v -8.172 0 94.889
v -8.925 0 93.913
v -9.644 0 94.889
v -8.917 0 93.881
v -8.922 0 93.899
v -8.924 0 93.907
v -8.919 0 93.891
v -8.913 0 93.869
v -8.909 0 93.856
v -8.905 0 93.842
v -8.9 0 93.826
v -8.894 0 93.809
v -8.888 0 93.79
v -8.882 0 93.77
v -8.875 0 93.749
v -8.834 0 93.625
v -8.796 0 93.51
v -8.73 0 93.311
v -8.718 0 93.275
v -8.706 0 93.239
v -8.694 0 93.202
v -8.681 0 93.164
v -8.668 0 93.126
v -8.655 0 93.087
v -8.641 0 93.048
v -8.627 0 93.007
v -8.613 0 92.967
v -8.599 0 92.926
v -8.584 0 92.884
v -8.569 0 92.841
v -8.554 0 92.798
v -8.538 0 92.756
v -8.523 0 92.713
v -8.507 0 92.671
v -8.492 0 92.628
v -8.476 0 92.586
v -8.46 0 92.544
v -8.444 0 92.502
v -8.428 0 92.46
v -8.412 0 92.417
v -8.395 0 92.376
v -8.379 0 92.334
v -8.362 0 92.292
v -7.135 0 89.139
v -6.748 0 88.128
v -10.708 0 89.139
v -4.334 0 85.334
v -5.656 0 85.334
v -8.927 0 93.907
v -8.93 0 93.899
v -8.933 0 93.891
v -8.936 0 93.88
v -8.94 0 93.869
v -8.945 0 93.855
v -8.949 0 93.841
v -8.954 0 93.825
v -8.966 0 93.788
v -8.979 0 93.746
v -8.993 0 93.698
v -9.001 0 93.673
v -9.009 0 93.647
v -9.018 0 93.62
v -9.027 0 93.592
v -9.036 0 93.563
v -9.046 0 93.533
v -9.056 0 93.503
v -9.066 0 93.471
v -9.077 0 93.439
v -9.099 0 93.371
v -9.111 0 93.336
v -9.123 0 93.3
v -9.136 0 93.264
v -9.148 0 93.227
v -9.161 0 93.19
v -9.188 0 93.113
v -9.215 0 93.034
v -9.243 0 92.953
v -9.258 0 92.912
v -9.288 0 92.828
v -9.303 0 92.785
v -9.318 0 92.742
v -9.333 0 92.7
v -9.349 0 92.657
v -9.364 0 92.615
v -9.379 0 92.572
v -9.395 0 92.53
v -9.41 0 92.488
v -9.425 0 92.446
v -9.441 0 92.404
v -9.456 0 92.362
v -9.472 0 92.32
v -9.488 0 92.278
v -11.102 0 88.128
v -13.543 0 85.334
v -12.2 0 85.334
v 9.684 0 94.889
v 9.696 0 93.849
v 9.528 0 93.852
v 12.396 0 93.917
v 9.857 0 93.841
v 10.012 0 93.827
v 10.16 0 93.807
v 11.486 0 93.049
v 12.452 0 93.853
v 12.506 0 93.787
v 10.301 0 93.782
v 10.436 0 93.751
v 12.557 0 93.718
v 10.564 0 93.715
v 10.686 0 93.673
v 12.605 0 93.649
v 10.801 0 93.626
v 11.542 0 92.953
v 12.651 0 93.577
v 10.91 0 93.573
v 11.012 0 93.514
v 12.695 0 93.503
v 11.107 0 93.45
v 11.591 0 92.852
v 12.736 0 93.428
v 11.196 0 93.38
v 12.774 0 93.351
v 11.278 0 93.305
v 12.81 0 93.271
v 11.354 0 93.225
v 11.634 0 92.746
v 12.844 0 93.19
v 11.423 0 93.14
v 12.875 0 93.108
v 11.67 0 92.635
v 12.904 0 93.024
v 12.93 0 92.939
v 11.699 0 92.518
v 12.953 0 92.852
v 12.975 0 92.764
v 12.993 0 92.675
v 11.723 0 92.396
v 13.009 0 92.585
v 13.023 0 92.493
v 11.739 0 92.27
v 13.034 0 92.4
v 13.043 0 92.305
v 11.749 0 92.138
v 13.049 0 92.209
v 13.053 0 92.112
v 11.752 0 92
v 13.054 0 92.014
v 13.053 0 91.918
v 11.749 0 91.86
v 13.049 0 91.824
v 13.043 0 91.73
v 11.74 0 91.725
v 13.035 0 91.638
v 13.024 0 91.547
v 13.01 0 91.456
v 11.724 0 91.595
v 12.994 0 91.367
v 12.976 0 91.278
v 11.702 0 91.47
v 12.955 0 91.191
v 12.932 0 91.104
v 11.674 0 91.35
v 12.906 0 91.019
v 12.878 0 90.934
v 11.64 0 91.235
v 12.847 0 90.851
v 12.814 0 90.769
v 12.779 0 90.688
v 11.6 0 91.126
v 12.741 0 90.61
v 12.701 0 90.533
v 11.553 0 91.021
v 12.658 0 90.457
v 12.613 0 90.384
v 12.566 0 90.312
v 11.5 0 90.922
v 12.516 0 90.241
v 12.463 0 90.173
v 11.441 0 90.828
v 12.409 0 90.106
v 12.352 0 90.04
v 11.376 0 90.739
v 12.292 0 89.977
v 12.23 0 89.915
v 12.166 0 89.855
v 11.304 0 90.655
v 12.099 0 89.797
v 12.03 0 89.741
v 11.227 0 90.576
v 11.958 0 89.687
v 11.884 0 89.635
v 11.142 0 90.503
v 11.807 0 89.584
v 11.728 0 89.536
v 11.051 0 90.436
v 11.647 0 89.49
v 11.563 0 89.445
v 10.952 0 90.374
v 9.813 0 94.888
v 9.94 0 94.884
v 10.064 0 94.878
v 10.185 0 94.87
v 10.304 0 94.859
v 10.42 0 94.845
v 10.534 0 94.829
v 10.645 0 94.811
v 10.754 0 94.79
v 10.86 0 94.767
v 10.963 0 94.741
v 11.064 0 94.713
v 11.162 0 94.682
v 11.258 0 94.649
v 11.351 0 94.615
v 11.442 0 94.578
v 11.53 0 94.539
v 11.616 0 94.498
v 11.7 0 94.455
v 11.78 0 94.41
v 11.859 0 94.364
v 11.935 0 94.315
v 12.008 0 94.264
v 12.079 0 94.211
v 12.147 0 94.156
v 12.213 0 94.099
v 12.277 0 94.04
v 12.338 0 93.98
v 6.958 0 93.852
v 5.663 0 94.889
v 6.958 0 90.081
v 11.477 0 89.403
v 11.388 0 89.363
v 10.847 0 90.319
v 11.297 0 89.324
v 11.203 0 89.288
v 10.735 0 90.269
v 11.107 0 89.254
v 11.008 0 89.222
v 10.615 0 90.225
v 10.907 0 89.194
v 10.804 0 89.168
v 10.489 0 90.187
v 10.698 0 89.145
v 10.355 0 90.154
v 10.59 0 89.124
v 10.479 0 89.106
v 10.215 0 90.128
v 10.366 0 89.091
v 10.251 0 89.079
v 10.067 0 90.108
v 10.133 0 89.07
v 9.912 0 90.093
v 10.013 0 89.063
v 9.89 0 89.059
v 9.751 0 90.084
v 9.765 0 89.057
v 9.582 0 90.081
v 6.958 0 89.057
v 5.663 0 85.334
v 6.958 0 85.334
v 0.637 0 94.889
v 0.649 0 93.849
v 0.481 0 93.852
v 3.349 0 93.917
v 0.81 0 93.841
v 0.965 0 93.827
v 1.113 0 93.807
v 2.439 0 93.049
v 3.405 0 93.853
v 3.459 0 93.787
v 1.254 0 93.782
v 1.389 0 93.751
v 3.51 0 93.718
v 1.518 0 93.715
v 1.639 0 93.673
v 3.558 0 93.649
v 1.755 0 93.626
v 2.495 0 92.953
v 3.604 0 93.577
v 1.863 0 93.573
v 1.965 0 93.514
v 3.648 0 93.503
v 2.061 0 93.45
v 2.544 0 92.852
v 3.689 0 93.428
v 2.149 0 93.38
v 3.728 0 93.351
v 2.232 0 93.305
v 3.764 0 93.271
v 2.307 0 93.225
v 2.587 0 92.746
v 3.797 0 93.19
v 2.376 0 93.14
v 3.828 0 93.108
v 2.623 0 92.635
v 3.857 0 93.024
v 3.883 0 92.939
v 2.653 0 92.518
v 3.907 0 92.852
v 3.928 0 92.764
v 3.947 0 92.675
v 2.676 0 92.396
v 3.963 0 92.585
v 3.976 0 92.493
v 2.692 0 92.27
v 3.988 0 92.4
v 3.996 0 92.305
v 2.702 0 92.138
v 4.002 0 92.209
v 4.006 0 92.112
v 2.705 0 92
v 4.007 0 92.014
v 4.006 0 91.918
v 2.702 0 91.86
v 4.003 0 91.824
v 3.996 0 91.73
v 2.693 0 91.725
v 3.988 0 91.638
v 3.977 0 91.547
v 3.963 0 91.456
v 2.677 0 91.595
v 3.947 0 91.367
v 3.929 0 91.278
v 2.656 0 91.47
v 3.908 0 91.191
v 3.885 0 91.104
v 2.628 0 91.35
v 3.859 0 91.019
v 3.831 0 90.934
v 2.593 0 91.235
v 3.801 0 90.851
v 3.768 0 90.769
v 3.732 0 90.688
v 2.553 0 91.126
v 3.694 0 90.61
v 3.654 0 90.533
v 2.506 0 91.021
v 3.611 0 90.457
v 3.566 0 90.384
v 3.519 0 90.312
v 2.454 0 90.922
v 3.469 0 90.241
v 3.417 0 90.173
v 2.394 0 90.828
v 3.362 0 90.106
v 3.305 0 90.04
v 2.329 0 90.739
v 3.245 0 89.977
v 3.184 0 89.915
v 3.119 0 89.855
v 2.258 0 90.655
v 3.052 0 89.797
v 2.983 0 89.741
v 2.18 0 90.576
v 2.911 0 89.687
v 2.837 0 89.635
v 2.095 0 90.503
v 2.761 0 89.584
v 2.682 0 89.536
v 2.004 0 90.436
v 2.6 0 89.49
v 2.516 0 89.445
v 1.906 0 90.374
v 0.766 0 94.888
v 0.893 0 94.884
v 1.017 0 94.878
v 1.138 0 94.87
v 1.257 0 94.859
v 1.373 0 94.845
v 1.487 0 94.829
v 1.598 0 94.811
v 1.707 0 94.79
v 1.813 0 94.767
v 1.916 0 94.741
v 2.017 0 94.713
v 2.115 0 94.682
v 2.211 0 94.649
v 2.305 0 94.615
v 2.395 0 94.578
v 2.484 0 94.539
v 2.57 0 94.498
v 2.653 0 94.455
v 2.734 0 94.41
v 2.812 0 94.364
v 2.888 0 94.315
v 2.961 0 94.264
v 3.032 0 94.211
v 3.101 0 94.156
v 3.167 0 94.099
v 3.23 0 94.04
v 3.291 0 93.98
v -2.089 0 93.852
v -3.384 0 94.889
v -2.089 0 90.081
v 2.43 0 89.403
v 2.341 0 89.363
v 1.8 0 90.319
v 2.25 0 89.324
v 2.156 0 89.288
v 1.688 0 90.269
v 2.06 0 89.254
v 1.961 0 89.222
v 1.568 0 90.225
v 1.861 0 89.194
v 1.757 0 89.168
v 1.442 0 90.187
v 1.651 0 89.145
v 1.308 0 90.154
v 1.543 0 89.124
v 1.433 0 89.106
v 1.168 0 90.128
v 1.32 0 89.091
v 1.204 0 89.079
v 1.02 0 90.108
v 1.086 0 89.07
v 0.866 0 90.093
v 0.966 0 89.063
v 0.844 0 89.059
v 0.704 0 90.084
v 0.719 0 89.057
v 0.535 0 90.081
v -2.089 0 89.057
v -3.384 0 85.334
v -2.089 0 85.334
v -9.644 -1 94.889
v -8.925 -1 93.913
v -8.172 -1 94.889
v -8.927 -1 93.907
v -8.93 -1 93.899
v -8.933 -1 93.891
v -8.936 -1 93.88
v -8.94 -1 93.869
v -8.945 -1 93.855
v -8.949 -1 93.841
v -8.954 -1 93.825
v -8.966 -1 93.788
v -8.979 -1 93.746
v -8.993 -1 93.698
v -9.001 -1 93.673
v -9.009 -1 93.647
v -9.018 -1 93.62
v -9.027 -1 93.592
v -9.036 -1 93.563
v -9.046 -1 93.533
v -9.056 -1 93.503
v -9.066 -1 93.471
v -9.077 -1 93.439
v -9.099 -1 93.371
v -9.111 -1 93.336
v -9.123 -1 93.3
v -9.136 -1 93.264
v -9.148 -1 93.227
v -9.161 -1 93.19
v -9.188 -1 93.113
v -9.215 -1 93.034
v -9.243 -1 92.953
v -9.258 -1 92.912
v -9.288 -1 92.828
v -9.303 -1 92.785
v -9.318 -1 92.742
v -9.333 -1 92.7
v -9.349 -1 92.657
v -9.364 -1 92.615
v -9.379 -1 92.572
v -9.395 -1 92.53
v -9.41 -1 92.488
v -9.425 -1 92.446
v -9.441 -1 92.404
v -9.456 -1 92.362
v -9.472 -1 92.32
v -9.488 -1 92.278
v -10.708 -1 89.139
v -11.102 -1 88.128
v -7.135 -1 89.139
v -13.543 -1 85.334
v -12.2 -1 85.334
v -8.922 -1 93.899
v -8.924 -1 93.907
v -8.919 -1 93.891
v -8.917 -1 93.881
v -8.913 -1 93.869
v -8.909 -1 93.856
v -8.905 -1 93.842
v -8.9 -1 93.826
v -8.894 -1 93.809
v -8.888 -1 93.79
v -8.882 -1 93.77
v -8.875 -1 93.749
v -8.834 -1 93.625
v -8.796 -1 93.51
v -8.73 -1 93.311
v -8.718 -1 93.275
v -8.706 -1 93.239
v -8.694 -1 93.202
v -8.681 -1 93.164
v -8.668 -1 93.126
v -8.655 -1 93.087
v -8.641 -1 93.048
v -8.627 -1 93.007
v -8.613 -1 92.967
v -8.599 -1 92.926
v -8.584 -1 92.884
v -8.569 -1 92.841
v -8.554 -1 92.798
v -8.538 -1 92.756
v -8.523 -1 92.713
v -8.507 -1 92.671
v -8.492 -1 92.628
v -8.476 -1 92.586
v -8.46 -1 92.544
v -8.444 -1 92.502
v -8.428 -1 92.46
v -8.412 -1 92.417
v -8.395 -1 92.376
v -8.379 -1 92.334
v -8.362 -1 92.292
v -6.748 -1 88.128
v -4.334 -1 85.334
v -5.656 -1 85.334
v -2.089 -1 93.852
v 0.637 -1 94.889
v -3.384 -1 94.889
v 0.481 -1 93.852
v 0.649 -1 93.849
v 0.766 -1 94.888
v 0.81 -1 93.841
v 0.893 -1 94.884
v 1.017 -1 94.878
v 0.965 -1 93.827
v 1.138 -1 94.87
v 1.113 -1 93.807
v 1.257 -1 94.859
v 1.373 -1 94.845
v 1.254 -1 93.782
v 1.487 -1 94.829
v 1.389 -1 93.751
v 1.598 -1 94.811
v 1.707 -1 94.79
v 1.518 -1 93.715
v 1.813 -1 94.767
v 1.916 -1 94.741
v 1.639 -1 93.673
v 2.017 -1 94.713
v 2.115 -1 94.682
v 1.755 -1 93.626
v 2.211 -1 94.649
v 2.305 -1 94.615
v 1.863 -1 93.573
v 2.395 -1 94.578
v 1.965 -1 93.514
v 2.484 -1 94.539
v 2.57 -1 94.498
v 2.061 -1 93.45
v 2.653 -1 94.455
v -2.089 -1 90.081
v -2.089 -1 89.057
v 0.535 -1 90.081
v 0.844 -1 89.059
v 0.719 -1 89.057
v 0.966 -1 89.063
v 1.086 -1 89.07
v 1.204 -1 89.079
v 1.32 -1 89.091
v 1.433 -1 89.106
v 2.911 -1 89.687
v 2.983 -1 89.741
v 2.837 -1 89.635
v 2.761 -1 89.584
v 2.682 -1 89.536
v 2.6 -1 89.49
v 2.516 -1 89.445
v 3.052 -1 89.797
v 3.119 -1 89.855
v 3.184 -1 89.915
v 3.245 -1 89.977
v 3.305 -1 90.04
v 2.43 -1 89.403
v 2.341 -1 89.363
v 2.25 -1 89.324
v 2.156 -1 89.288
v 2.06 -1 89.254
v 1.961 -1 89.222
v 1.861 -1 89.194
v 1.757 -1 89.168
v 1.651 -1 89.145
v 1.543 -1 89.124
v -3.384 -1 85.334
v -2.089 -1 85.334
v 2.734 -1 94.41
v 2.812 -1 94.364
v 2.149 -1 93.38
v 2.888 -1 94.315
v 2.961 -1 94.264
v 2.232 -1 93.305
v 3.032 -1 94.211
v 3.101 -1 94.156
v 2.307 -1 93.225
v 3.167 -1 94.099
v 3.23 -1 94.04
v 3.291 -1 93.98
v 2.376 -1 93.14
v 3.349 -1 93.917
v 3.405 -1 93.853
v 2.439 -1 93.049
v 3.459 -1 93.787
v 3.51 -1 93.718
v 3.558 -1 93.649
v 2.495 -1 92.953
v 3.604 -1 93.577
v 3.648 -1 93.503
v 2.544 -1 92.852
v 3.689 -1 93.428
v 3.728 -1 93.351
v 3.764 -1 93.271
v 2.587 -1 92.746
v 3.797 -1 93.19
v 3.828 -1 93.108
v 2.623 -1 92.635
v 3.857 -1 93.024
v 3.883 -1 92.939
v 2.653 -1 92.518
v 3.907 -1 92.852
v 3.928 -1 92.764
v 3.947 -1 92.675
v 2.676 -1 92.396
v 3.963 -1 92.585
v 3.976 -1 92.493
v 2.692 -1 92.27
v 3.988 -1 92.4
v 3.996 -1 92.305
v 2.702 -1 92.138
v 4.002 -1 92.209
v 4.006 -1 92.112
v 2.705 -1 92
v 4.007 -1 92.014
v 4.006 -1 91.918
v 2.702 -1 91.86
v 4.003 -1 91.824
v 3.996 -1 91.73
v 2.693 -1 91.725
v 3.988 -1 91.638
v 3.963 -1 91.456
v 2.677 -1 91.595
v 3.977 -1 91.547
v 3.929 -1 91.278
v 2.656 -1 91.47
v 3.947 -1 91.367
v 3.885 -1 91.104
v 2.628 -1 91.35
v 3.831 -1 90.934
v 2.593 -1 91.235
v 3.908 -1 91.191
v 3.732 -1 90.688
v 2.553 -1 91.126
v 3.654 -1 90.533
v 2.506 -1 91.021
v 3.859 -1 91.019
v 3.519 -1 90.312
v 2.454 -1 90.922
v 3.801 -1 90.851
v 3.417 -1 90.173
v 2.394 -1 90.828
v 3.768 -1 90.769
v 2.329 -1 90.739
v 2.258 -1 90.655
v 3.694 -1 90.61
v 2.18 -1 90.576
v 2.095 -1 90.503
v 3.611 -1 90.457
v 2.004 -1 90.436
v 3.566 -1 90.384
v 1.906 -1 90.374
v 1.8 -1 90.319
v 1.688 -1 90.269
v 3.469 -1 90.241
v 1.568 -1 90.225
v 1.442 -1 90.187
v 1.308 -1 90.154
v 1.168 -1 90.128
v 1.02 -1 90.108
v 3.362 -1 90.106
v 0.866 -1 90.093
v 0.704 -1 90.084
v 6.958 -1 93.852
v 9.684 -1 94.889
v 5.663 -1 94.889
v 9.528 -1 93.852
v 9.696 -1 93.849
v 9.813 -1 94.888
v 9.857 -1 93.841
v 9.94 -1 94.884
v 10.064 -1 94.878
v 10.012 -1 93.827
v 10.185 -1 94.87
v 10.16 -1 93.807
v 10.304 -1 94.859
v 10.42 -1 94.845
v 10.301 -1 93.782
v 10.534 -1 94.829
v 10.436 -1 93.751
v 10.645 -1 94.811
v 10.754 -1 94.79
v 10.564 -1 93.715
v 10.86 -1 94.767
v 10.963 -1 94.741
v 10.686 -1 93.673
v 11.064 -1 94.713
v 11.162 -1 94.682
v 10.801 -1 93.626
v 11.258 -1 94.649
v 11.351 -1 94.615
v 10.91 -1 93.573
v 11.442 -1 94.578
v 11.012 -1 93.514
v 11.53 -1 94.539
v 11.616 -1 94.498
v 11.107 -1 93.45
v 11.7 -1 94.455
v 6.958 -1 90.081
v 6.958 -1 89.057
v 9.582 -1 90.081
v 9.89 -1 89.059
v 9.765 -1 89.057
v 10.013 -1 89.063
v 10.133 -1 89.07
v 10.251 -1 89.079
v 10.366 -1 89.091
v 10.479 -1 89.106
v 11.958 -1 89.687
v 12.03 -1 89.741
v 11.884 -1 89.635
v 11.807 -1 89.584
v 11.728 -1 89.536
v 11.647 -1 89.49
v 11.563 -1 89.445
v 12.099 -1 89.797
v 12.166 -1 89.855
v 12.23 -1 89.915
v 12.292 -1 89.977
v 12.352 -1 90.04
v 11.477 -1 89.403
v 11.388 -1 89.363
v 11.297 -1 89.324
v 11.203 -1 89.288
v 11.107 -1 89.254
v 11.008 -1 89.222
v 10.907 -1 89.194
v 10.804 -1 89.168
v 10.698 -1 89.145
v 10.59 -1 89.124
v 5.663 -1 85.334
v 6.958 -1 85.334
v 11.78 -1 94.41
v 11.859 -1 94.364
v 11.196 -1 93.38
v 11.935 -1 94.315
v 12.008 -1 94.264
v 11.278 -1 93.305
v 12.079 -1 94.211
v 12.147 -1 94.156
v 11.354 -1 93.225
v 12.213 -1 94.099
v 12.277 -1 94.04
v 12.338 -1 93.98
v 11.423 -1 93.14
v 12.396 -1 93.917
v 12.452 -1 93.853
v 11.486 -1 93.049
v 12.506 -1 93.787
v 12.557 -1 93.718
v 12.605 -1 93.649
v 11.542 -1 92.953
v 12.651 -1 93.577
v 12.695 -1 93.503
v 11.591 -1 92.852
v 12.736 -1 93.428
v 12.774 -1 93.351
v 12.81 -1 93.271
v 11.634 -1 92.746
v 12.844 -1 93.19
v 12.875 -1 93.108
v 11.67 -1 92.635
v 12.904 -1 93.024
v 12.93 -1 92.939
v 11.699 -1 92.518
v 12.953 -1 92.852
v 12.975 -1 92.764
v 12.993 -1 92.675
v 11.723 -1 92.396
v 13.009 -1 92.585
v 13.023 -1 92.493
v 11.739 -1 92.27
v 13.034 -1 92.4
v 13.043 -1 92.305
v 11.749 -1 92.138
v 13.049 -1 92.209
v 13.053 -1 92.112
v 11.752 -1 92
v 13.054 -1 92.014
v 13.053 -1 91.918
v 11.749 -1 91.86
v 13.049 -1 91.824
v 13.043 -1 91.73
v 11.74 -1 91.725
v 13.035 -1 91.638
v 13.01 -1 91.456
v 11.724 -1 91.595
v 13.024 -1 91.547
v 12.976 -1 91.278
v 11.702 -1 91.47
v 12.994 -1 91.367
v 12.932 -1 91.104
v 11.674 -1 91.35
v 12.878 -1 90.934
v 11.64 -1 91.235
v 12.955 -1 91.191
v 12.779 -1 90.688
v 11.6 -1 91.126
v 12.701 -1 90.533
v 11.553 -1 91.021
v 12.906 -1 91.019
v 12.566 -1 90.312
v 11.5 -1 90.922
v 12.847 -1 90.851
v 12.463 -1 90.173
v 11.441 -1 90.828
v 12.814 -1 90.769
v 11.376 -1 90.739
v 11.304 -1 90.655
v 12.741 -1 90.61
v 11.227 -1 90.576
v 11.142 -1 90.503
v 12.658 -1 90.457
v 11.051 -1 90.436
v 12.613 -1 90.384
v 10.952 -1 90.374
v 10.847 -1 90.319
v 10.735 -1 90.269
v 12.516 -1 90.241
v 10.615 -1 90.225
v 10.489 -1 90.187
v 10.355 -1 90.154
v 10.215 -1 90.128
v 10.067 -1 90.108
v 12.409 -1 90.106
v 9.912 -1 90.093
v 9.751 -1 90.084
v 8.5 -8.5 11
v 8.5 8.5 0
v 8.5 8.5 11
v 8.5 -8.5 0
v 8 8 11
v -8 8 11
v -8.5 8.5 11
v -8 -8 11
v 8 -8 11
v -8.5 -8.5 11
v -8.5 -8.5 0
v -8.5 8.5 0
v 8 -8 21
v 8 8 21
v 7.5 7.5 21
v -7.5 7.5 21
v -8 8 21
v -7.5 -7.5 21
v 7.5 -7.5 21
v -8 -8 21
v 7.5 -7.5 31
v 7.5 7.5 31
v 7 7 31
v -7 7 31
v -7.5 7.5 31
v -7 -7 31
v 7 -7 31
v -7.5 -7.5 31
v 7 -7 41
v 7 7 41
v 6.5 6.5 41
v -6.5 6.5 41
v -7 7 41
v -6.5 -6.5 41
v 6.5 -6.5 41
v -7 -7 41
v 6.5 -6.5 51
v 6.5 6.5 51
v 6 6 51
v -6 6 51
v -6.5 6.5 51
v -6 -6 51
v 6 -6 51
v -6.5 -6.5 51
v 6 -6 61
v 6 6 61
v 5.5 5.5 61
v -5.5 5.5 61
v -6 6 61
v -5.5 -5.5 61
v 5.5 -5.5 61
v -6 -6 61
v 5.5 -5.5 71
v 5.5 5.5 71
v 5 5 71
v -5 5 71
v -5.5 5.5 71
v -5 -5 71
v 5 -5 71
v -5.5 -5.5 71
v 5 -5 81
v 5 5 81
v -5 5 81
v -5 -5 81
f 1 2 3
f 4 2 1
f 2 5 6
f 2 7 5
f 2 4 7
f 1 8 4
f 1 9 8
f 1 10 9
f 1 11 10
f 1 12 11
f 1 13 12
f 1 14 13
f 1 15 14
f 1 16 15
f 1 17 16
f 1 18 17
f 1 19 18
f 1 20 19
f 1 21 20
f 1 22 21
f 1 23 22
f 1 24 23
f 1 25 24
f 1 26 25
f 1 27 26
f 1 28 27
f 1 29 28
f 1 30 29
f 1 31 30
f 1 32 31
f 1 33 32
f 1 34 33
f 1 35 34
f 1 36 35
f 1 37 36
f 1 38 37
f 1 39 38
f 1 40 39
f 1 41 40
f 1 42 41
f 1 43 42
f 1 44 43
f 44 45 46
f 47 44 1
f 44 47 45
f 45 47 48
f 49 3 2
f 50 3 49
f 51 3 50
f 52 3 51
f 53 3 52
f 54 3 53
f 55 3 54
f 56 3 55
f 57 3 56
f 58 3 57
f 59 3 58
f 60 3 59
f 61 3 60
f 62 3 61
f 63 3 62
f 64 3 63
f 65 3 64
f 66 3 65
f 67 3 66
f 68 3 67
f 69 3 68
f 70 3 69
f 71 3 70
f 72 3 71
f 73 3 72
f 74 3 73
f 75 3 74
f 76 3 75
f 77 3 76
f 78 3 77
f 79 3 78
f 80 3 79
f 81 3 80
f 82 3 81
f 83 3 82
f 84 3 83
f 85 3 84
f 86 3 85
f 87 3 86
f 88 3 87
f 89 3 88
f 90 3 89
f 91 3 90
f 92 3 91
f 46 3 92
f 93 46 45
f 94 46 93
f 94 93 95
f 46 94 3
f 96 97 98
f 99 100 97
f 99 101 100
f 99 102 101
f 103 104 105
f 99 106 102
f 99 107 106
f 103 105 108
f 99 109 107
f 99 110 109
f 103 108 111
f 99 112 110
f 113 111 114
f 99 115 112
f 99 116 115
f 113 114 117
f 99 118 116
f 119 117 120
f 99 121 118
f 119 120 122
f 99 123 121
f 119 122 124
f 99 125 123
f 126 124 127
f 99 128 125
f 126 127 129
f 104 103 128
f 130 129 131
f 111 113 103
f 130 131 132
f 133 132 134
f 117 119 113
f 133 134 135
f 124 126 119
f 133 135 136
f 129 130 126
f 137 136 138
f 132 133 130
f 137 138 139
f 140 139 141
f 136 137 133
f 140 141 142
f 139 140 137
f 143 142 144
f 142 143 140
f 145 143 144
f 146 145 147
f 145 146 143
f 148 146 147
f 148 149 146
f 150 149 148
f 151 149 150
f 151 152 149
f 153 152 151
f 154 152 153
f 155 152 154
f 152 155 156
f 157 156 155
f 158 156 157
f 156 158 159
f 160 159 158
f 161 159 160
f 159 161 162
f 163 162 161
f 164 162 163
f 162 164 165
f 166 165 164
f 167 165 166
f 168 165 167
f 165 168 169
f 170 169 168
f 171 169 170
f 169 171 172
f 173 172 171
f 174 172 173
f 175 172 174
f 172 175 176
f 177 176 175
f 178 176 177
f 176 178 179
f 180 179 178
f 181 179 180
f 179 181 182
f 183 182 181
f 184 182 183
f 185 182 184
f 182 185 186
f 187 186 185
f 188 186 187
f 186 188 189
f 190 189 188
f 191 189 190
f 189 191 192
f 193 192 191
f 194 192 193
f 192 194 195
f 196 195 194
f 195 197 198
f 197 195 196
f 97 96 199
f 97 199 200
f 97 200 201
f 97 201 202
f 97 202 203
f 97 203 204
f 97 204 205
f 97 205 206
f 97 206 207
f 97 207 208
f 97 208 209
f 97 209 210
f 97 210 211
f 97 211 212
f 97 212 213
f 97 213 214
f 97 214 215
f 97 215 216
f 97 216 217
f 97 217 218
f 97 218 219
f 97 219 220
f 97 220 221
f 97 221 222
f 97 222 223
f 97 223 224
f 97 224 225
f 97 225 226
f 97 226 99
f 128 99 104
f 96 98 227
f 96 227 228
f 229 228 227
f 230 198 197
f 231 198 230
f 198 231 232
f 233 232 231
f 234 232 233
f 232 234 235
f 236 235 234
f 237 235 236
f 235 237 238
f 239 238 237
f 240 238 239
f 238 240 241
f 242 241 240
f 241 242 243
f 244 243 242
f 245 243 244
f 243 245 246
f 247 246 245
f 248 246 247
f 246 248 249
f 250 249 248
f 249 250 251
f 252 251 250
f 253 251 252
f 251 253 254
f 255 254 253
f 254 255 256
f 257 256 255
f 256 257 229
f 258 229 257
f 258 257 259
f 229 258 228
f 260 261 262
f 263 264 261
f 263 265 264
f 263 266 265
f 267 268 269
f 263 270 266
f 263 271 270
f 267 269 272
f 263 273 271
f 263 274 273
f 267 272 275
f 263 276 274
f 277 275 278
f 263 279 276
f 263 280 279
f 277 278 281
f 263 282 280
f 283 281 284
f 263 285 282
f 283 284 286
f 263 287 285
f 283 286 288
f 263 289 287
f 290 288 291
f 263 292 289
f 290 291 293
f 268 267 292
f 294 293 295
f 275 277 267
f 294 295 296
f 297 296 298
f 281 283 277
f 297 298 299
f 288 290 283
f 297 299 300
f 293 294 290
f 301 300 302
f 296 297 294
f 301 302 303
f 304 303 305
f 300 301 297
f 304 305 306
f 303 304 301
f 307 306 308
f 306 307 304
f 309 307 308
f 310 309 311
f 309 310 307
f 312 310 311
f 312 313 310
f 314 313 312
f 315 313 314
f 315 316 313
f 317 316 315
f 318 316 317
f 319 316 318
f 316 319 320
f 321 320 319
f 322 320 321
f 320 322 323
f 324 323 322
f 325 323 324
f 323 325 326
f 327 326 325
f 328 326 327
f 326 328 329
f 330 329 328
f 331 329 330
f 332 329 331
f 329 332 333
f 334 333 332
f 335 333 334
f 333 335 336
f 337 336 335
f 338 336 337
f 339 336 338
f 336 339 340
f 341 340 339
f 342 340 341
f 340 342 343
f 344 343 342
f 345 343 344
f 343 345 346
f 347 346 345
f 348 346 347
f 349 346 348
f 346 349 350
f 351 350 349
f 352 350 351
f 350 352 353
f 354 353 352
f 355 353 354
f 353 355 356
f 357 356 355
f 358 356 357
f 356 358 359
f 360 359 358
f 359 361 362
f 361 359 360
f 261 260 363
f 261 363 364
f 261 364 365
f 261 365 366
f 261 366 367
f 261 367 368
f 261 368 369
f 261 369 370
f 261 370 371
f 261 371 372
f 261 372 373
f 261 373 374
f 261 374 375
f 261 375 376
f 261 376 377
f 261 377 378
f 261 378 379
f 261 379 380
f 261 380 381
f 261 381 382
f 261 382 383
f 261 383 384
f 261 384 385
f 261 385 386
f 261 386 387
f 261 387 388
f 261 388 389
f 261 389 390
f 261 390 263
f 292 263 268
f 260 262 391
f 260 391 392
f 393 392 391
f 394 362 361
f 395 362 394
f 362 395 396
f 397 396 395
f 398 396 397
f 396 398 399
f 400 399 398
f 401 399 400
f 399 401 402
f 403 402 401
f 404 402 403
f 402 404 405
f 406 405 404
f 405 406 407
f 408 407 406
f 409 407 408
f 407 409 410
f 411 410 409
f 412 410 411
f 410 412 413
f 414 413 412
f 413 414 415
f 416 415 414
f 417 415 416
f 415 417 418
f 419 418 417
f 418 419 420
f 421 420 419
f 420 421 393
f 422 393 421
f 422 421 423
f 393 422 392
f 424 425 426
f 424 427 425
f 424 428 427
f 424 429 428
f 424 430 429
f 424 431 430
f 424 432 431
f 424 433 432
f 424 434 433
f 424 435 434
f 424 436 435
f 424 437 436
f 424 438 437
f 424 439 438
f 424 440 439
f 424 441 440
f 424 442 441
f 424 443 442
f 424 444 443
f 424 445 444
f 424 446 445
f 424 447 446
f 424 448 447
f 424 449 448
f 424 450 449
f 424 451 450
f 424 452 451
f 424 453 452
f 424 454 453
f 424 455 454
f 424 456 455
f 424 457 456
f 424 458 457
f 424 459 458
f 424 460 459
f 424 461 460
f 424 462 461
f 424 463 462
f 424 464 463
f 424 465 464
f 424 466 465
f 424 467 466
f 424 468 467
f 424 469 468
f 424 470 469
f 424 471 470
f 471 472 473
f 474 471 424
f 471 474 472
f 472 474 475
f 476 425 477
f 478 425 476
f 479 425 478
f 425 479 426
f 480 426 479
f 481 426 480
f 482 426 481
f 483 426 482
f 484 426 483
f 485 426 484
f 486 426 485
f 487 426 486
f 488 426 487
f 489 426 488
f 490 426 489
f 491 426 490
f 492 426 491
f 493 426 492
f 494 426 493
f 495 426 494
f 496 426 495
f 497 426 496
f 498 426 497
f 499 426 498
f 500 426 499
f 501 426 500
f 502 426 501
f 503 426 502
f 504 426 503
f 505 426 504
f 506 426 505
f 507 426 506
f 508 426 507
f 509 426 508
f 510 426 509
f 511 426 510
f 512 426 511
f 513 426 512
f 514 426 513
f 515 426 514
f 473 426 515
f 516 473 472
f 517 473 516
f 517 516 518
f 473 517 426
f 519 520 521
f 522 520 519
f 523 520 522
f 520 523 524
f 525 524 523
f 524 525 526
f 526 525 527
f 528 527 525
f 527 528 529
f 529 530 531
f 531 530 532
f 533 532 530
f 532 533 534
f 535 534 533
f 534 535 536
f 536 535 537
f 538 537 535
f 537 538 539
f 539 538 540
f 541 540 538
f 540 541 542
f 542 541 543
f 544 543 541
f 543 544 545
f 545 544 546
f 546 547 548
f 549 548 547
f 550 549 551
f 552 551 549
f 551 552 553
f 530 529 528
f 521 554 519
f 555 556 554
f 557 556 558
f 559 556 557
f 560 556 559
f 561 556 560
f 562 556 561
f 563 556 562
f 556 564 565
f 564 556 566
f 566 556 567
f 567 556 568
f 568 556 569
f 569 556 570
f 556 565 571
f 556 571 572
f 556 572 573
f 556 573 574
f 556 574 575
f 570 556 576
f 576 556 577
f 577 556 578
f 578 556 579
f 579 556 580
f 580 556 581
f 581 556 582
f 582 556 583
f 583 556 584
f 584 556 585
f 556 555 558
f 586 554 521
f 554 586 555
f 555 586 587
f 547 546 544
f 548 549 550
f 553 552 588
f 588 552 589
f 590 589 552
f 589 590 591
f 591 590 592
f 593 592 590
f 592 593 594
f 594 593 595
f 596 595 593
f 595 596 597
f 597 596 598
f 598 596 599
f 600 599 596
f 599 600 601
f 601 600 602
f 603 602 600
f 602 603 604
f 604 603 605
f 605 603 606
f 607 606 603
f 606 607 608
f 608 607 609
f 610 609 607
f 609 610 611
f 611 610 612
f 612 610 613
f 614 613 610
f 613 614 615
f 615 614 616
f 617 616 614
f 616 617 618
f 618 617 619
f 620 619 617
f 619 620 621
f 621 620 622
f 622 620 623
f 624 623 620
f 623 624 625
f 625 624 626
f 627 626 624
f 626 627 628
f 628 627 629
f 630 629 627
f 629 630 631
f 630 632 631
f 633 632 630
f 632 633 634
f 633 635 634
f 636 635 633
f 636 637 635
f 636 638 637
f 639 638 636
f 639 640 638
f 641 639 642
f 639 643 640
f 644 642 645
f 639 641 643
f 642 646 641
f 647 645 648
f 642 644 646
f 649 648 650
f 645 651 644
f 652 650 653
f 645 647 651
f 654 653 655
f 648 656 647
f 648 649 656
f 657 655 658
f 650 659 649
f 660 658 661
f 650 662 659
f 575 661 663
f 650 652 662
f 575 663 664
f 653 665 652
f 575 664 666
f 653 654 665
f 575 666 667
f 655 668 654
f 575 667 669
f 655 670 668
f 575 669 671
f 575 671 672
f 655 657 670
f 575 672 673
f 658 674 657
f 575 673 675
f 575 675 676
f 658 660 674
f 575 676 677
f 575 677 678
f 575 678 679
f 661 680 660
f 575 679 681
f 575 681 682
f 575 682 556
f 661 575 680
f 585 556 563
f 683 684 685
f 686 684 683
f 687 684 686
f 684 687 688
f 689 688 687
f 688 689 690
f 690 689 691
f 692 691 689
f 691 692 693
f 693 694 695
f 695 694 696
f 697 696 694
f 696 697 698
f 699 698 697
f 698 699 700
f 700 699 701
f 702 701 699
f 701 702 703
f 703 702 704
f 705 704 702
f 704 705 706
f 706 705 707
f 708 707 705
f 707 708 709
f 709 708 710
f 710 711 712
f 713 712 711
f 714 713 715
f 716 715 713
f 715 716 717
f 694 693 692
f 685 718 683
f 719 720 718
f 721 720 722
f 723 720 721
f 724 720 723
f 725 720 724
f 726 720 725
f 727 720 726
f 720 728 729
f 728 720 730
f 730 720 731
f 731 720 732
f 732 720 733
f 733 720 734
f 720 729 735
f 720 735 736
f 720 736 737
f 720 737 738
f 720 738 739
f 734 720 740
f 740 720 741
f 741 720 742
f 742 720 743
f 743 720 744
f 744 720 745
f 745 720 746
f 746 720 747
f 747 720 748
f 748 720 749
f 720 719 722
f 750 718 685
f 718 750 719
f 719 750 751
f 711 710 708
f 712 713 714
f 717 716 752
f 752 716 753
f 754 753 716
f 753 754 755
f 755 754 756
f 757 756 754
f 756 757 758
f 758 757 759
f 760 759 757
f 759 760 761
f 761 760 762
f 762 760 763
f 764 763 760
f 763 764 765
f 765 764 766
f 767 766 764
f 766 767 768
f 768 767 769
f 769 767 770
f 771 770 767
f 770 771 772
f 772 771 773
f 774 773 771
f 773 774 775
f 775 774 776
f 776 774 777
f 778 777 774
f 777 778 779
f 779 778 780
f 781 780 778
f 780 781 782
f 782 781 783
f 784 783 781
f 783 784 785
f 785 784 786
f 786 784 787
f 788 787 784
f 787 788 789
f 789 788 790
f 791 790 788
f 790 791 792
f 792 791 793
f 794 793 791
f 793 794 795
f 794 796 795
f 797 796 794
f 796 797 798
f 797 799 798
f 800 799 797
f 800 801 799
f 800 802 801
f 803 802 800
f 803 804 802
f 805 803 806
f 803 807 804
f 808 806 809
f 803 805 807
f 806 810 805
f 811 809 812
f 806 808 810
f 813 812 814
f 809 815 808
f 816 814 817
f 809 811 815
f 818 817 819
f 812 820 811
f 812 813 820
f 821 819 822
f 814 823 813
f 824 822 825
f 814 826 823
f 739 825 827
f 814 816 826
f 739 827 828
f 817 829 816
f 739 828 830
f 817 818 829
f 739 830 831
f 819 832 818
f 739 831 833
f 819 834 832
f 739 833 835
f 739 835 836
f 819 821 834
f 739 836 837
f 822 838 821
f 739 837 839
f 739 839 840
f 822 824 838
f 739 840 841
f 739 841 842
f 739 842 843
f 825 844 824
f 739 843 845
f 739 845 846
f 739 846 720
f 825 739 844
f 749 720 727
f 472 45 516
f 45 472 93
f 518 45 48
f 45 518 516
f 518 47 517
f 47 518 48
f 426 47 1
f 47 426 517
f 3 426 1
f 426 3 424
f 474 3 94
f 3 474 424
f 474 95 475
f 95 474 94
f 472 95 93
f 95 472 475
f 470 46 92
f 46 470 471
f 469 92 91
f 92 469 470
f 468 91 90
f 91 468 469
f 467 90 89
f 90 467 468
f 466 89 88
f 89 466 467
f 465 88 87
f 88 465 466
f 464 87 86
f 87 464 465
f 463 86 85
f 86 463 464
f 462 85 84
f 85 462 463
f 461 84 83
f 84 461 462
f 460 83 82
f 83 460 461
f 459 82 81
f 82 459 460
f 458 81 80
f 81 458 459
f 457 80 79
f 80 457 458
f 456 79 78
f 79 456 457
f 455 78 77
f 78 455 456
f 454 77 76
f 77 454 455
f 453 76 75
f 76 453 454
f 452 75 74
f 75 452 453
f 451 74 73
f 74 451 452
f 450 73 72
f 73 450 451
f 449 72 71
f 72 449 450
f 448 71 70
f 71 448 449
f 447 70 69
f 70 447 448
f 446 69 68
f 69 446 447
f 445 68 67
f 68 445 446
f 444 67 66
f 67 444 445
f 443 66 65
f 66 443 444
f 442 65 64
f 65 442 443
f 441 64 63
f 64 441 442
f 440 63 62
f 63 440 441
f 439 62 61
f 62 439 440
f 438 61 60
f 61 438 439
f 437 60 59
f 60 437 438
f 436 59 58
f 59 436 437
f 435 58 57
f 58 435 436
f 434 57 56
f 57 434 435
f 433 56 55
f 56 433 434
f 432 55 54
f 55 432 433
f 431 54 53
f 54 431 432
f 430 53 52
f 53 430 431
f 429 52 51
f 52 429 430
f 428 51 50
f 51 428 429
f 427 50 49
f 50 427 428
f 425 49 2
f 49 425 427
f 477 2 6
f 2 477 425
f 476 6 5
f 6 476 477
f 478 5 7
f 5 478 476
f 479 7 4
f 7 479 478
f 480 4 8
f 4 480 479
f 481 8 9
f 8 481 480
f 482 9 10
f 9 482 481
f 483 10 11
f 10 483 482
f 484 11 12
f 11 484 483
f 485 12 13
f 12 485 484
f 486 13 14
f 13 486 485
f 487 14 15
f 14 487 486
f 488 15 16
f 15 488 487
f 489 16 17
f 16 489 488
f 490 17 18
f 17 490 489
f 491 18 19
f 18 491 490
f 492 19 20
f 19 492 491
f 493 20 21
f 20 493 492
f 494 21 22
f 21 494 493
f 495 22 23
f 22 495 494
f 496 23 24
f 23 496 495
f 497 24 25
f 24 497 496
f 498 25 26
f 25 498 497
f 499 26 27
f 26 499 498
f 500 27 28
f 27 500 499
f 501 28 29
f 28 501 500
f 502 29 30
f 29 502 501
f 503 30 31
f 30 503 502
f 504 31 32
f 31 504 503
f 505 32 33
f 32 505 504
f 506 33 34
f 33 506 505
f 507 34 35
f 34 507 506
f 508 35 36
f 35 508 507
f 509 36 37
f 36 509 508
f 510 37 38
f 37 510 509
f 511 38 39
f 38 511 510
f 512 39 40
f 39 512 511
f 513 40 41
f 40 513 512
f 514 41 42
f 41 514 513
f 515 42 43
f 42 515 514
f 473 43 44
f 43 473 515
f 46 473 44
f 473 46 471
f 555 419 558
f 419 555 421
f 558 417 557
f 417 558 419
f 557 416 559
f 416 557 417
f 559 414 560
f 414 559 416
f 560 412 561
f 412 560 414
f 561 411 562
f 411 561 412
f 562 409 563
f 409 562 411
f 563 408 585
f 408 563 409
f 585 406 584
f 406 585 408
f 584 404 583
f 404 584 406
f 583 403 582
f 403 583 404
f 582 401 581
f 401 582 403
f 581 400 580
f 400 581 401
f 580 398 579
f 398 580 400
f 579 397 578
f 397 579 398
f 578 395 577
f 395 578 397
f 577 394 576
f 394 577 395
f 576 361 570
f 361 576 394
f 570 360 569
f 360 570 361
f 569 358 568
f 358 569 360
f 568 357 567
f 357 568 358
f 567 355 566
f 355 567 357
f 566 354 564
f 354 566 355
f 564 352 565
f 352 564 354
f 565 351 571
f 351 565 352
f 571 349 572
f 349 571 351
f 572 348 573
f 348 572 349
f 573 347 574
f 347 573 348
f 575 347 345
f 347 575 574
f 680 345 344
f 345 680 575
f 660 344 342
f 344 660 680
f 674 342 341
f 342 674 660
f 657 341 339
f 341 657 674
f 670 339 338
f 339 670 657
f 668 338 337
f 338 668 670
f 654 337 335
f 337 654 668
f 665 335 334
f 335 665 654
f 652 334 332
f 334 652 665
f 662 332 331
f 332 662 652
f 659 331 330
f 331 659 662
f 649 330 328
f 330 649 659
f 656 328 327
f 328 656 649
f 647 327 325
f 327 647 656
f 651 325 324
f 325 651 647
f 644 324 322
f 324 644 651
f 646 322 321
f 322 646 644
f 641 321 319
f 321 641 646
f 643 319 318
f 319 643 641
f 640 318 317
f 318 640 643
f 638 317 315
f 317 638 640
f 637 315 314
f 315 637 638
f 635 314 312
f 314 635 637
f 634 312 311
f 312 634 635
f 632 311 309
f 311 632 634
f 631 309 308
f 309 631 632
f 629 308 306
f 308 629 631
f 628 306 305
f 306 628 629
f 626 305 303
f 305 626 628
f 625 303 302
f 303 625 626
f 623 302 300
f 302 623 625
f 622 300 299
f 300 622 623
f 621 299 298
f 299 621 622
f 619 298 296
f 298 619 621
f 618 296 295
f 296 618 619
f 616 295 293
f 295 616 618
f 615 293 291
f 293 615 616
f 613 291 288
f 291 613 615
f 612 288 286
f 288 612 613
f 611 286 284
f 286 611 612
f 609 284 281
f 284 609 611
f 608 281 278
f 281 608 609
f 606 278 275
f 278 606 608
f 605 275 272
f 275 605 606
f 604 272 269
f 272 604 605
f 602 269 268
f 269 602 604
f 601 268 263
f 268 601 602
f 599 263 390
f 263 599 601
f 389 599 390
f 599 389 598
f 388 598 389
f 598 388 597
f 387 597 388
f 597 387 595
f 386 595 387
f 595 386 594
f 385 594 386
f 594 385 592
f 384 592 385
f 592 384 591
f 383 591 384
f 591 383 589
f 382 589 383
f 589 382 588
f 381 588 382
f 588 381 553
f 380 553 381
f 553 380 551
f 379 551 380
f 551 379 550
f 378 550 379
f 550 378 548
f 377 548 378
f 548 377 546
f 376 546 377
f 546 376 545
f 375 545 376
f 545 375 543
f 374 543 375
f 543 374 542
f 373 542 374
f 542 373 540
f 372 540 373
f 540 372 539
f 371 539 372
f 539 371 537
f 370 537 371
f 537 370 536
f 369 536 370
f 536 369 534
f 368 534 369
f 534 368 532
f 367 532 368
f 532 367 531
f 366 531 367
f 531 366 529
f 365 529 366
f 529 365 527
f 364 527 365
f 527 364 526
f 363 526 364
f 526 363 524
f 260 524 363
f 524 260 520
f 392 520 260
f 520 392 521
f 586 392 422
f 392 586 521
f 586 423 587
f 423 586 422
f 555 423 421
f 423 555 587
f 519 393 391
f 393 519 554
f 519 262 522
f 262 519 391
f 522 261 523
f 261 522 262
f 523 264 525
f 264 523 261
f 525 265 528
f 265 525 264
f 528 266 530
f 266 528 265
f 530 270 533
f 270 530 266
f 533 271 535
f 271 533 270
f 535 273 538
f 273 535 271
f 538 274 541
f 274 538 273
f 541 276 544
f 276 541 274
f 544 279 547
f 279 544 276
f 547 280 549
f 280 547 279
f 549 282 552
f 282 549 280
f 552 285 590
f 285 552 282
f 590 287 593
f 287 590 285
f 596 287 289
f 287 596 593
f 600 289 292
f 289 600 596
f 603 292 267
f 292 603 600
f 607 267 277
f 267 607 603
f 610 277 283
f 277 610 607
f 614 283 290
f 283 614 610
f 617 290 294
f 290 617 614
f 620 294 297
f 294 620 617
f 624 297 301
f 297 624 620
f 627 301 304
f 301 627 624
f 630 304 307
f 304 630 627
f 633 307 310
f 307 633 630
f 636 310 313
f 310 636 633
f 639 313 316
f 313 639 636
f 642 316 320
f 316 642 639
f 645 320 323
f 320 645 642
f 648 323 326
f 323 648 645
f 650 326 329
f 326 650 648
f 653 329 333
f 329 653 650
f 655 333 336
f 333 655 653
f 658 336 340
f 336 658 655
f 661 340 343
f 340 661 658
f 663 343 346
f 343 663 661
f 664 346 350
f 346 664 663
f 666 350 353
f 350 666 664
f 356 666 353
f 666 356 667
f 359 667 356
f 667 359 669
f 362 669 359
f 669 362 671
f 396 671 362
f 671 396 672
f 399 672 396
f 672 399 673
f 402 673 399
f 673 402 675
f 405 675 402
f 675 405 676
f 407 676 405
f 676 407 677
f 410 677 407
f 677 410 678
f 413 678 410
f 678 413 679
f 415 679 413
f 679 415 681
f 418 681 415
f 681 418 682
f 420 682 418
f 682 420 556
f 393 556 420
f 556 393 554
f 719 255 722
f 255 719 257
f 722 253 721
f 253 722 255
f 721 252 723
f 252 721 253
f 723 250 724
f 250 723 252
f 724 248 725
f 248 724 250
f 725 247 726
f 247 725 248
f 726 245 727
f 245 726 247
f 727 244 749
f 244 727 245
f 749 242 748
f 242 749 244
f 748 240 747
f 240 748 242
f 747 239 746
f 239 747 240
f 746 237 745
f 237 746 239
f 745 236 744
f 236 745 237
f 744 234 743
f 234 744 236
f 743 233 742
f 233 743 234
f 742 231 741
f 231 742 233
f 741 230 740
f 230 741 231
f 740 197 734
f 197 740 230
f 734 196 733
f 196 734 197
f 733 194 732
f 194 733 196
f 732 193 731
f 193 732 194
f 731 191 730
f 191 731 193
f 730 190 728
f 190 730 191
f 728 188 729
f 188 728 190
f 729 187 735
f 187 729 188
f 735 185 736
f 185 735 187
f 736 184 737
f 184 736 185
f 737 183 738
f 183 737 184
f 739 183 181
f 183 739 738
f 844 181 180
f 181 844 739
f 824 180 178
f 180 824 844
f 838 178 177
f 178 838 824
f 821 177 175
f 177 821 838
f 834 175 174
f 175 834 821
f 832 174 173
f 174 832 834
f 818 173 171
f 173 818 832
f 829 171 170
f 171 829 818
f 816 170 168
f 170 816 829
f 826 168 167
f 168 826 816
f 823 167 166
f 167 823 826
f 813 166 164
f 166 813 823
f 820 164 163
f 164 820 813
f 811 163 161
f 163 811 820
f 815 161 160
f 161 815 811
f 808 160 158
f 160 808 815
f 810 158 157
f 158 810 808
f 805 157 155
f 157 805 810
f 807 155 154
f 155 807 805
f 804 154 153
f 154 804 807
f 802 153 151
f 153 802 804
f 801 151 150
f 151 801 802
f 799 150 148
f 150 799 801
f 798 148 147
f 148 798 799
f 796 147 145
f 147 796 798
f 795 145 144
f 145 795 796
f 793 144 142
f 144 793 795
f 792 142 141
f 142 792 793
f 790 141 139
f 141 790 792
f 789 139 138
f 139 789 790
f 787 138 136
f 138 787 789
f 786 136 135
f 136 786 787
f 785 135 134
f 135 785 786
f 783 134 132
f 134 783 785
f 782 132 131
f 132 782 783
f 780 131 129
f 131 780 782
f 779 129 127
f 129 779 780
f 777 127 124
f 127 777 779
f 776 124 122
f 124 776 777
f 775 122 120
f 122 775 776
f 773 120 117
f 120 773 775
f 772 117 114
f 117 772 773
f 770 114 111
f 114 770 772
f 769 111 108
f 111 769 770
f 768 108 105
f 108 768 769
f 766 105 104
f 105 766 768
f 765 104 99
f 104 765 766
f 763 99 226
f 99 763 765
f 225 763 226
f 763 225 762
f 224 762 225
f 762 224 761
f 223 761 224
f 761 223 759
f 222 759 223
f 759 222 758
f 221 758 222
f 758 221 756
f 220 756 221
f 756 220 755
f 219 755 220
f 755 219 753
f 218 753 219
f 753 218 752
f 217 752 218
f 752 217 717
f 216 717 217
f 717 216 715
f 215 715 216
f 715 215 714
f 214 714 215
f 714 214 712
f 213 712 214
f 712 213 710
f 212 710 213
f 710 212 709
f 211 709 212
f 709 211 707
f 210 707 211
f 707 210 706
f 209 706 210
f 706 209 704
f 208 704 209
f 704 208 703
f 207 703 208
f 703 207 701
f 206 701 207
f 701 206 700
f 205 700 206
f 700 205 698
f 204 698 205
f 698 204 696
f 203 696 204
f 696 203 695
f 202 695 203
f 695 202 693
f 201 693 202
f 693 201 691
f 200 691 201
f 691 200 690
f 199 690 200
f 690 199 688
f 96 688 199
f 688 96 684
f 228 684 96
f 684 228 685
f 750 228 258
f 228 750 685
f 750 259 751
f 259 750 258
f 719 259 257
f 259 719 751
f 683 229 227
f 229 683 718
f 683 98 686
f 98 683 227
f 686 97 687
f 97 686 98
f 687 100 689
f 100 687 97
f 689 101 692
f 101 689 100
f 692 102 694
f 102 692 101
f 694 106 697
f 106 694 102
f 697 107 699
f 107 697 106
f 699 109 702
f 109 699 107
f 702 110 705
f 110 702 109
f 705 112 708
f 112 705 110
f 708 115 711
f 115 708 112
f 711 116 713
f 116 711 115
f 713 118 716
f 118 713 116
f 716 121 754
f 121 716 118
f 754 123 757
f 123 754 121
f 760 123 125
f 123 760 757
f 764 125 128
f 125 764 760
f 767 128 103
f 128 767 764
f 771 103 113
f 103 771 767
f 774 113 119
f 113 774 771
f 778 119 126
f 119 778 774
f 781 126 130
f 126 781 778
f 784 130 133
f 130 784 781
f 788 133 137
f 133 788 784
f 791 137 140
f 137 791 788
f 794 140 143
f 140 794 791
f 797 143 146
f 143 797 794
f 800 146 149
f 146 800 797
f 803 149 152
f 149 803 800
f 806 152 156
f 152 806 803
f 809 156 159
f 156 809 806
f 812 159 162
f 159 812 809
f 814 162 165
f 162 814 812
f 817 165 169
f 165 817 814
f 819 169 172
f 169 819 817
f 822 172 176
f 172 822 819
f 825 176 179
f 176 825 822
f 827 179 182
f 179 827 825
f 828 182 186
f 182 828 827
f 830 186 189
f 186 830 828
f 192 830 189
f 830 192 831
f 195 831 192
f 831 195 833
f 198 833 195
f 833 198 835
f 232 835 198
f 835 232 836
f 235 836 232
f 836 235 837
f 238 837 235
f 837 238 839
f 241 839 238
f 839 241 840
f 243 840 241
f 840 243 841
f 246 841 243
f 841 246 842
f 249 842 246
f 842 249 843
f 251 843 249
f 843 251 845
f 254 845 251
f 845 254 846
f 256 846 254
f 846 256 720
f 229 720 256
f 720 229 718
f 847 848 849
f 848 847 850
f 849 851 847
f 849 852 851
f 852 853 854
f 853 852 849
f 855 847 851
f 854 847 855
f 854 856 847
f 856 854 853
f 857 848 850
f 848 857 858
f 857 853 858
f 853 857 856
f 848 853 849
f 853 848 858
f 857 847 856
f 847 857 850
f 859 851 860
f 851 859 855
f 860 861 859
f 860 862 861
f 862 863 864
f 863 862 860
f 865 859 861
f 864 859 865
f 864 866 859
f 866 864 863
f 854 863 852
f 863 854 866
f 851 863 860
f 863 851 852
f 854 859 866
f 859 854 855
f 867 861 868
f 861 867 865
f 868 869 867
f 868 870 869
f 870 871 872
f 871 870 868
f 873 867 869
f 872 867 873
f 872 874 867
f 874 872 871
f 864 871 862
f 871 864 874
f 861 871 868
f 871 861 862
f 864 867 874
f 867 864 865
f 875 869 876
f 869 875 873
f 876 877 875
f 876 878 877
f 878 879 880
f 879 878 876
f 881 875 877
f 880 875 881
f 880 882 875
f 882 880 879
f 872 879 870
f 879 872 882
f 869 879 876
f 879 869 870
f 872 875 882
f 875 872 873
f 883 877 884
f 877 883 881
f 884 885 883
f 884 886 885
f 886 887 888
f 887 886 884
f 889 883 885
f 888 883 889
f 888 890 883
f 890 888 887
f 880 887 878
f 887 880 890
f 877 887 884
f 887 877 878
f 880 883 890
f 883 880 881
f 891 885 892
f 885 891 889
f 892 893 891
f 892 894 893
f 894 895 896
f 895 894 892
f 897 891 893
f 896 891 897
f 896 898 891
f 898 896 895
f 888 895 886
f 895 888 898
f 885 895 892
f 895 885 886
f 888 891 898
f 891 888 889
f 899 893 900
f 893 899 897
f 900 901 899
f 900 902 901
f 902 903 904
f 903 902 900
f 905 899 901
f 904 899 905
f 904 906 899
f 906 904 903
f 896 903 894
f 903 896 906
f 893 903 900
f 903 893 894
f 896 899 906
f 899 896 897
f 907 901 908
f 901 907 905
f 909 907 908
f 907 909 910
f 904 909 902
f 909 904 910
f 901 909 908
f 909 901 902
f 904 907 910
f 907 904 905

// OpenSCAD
$fn = 100 ;


function select(vector, indices) = [ for (index = indices) vector[index] ];

layer = [0, 0, 10 ] ;
app1 = ["app1" , [0, 0, 0] ] ;
app2 = ["app2" , [10, 0, 0] ] ;
layers = [  ["Meta" , 0, [17,17, layer.z + 1], [1,1,1,0] ],
            ["HW"   , 1, [16,16, layer.z + 1], [0,0,1,1] ],
            ["L2"   , 2, [15,15, layer.z + 1], [1,.7,0,.5] ],
            ["L3"   , 3, [14,14, layer.z + 1], [1,.7,0,.5] ],
            ["L4"   , 4, [13,13, layer.z + 1], [1,.7,0,.5] ],
            ["L4"   , 5, [12,12, layer.z + 1], [1,1,1,.5] ],
            ["L4"   , 6, [11,11, layer.z + 1], [1,1,1,.5] ],
            ["APP"  , 7, [10,10, layer.z + 1], [1,0,0,.5] ]
            ];

echo (app2[0]) ; echo (app2[1]) ;
echo (layers[1]) ;

//list parsing example
test=select(layers , 5) ; echo(test) ; 
testIn=test[0] ; echo(testIn) ; 
testInIn=testIn[0] ; echo(testInIn) ;

module subStack(stackLayer) {
    lib = select(layers , stackLayer) ; var = lib[0] ;
    label = var[0] ; stackLayer = var[1] ; dimensions = var[2] ; color = var[3] ;
    echo("stack test: ", label, layer, dimensions);
    translate(stackLayer * layer + [0, 0, dimensions.z/2] )
        color(color)
            cube(dimensions, center = true) ;
}

module stack(stackLayer) {
    lib = select(layers , stackLayer) ; var = lib[0] ;
    label = var[0] ; stackLayer = var[1] ; dimensions = var[2] ; color = var[3] ;
    translate( (stackLayer + 2)* layer) rotate([90,0,0]) linear_extrude(1) text(label,valign="center",halign="center");
    subStack(0);
    subStack(1);
    subStack(2);
    subStack(3);
    subStack(4);
    subStack(5);
    subStack(6);
    subStack(7);
}

stack(7);
